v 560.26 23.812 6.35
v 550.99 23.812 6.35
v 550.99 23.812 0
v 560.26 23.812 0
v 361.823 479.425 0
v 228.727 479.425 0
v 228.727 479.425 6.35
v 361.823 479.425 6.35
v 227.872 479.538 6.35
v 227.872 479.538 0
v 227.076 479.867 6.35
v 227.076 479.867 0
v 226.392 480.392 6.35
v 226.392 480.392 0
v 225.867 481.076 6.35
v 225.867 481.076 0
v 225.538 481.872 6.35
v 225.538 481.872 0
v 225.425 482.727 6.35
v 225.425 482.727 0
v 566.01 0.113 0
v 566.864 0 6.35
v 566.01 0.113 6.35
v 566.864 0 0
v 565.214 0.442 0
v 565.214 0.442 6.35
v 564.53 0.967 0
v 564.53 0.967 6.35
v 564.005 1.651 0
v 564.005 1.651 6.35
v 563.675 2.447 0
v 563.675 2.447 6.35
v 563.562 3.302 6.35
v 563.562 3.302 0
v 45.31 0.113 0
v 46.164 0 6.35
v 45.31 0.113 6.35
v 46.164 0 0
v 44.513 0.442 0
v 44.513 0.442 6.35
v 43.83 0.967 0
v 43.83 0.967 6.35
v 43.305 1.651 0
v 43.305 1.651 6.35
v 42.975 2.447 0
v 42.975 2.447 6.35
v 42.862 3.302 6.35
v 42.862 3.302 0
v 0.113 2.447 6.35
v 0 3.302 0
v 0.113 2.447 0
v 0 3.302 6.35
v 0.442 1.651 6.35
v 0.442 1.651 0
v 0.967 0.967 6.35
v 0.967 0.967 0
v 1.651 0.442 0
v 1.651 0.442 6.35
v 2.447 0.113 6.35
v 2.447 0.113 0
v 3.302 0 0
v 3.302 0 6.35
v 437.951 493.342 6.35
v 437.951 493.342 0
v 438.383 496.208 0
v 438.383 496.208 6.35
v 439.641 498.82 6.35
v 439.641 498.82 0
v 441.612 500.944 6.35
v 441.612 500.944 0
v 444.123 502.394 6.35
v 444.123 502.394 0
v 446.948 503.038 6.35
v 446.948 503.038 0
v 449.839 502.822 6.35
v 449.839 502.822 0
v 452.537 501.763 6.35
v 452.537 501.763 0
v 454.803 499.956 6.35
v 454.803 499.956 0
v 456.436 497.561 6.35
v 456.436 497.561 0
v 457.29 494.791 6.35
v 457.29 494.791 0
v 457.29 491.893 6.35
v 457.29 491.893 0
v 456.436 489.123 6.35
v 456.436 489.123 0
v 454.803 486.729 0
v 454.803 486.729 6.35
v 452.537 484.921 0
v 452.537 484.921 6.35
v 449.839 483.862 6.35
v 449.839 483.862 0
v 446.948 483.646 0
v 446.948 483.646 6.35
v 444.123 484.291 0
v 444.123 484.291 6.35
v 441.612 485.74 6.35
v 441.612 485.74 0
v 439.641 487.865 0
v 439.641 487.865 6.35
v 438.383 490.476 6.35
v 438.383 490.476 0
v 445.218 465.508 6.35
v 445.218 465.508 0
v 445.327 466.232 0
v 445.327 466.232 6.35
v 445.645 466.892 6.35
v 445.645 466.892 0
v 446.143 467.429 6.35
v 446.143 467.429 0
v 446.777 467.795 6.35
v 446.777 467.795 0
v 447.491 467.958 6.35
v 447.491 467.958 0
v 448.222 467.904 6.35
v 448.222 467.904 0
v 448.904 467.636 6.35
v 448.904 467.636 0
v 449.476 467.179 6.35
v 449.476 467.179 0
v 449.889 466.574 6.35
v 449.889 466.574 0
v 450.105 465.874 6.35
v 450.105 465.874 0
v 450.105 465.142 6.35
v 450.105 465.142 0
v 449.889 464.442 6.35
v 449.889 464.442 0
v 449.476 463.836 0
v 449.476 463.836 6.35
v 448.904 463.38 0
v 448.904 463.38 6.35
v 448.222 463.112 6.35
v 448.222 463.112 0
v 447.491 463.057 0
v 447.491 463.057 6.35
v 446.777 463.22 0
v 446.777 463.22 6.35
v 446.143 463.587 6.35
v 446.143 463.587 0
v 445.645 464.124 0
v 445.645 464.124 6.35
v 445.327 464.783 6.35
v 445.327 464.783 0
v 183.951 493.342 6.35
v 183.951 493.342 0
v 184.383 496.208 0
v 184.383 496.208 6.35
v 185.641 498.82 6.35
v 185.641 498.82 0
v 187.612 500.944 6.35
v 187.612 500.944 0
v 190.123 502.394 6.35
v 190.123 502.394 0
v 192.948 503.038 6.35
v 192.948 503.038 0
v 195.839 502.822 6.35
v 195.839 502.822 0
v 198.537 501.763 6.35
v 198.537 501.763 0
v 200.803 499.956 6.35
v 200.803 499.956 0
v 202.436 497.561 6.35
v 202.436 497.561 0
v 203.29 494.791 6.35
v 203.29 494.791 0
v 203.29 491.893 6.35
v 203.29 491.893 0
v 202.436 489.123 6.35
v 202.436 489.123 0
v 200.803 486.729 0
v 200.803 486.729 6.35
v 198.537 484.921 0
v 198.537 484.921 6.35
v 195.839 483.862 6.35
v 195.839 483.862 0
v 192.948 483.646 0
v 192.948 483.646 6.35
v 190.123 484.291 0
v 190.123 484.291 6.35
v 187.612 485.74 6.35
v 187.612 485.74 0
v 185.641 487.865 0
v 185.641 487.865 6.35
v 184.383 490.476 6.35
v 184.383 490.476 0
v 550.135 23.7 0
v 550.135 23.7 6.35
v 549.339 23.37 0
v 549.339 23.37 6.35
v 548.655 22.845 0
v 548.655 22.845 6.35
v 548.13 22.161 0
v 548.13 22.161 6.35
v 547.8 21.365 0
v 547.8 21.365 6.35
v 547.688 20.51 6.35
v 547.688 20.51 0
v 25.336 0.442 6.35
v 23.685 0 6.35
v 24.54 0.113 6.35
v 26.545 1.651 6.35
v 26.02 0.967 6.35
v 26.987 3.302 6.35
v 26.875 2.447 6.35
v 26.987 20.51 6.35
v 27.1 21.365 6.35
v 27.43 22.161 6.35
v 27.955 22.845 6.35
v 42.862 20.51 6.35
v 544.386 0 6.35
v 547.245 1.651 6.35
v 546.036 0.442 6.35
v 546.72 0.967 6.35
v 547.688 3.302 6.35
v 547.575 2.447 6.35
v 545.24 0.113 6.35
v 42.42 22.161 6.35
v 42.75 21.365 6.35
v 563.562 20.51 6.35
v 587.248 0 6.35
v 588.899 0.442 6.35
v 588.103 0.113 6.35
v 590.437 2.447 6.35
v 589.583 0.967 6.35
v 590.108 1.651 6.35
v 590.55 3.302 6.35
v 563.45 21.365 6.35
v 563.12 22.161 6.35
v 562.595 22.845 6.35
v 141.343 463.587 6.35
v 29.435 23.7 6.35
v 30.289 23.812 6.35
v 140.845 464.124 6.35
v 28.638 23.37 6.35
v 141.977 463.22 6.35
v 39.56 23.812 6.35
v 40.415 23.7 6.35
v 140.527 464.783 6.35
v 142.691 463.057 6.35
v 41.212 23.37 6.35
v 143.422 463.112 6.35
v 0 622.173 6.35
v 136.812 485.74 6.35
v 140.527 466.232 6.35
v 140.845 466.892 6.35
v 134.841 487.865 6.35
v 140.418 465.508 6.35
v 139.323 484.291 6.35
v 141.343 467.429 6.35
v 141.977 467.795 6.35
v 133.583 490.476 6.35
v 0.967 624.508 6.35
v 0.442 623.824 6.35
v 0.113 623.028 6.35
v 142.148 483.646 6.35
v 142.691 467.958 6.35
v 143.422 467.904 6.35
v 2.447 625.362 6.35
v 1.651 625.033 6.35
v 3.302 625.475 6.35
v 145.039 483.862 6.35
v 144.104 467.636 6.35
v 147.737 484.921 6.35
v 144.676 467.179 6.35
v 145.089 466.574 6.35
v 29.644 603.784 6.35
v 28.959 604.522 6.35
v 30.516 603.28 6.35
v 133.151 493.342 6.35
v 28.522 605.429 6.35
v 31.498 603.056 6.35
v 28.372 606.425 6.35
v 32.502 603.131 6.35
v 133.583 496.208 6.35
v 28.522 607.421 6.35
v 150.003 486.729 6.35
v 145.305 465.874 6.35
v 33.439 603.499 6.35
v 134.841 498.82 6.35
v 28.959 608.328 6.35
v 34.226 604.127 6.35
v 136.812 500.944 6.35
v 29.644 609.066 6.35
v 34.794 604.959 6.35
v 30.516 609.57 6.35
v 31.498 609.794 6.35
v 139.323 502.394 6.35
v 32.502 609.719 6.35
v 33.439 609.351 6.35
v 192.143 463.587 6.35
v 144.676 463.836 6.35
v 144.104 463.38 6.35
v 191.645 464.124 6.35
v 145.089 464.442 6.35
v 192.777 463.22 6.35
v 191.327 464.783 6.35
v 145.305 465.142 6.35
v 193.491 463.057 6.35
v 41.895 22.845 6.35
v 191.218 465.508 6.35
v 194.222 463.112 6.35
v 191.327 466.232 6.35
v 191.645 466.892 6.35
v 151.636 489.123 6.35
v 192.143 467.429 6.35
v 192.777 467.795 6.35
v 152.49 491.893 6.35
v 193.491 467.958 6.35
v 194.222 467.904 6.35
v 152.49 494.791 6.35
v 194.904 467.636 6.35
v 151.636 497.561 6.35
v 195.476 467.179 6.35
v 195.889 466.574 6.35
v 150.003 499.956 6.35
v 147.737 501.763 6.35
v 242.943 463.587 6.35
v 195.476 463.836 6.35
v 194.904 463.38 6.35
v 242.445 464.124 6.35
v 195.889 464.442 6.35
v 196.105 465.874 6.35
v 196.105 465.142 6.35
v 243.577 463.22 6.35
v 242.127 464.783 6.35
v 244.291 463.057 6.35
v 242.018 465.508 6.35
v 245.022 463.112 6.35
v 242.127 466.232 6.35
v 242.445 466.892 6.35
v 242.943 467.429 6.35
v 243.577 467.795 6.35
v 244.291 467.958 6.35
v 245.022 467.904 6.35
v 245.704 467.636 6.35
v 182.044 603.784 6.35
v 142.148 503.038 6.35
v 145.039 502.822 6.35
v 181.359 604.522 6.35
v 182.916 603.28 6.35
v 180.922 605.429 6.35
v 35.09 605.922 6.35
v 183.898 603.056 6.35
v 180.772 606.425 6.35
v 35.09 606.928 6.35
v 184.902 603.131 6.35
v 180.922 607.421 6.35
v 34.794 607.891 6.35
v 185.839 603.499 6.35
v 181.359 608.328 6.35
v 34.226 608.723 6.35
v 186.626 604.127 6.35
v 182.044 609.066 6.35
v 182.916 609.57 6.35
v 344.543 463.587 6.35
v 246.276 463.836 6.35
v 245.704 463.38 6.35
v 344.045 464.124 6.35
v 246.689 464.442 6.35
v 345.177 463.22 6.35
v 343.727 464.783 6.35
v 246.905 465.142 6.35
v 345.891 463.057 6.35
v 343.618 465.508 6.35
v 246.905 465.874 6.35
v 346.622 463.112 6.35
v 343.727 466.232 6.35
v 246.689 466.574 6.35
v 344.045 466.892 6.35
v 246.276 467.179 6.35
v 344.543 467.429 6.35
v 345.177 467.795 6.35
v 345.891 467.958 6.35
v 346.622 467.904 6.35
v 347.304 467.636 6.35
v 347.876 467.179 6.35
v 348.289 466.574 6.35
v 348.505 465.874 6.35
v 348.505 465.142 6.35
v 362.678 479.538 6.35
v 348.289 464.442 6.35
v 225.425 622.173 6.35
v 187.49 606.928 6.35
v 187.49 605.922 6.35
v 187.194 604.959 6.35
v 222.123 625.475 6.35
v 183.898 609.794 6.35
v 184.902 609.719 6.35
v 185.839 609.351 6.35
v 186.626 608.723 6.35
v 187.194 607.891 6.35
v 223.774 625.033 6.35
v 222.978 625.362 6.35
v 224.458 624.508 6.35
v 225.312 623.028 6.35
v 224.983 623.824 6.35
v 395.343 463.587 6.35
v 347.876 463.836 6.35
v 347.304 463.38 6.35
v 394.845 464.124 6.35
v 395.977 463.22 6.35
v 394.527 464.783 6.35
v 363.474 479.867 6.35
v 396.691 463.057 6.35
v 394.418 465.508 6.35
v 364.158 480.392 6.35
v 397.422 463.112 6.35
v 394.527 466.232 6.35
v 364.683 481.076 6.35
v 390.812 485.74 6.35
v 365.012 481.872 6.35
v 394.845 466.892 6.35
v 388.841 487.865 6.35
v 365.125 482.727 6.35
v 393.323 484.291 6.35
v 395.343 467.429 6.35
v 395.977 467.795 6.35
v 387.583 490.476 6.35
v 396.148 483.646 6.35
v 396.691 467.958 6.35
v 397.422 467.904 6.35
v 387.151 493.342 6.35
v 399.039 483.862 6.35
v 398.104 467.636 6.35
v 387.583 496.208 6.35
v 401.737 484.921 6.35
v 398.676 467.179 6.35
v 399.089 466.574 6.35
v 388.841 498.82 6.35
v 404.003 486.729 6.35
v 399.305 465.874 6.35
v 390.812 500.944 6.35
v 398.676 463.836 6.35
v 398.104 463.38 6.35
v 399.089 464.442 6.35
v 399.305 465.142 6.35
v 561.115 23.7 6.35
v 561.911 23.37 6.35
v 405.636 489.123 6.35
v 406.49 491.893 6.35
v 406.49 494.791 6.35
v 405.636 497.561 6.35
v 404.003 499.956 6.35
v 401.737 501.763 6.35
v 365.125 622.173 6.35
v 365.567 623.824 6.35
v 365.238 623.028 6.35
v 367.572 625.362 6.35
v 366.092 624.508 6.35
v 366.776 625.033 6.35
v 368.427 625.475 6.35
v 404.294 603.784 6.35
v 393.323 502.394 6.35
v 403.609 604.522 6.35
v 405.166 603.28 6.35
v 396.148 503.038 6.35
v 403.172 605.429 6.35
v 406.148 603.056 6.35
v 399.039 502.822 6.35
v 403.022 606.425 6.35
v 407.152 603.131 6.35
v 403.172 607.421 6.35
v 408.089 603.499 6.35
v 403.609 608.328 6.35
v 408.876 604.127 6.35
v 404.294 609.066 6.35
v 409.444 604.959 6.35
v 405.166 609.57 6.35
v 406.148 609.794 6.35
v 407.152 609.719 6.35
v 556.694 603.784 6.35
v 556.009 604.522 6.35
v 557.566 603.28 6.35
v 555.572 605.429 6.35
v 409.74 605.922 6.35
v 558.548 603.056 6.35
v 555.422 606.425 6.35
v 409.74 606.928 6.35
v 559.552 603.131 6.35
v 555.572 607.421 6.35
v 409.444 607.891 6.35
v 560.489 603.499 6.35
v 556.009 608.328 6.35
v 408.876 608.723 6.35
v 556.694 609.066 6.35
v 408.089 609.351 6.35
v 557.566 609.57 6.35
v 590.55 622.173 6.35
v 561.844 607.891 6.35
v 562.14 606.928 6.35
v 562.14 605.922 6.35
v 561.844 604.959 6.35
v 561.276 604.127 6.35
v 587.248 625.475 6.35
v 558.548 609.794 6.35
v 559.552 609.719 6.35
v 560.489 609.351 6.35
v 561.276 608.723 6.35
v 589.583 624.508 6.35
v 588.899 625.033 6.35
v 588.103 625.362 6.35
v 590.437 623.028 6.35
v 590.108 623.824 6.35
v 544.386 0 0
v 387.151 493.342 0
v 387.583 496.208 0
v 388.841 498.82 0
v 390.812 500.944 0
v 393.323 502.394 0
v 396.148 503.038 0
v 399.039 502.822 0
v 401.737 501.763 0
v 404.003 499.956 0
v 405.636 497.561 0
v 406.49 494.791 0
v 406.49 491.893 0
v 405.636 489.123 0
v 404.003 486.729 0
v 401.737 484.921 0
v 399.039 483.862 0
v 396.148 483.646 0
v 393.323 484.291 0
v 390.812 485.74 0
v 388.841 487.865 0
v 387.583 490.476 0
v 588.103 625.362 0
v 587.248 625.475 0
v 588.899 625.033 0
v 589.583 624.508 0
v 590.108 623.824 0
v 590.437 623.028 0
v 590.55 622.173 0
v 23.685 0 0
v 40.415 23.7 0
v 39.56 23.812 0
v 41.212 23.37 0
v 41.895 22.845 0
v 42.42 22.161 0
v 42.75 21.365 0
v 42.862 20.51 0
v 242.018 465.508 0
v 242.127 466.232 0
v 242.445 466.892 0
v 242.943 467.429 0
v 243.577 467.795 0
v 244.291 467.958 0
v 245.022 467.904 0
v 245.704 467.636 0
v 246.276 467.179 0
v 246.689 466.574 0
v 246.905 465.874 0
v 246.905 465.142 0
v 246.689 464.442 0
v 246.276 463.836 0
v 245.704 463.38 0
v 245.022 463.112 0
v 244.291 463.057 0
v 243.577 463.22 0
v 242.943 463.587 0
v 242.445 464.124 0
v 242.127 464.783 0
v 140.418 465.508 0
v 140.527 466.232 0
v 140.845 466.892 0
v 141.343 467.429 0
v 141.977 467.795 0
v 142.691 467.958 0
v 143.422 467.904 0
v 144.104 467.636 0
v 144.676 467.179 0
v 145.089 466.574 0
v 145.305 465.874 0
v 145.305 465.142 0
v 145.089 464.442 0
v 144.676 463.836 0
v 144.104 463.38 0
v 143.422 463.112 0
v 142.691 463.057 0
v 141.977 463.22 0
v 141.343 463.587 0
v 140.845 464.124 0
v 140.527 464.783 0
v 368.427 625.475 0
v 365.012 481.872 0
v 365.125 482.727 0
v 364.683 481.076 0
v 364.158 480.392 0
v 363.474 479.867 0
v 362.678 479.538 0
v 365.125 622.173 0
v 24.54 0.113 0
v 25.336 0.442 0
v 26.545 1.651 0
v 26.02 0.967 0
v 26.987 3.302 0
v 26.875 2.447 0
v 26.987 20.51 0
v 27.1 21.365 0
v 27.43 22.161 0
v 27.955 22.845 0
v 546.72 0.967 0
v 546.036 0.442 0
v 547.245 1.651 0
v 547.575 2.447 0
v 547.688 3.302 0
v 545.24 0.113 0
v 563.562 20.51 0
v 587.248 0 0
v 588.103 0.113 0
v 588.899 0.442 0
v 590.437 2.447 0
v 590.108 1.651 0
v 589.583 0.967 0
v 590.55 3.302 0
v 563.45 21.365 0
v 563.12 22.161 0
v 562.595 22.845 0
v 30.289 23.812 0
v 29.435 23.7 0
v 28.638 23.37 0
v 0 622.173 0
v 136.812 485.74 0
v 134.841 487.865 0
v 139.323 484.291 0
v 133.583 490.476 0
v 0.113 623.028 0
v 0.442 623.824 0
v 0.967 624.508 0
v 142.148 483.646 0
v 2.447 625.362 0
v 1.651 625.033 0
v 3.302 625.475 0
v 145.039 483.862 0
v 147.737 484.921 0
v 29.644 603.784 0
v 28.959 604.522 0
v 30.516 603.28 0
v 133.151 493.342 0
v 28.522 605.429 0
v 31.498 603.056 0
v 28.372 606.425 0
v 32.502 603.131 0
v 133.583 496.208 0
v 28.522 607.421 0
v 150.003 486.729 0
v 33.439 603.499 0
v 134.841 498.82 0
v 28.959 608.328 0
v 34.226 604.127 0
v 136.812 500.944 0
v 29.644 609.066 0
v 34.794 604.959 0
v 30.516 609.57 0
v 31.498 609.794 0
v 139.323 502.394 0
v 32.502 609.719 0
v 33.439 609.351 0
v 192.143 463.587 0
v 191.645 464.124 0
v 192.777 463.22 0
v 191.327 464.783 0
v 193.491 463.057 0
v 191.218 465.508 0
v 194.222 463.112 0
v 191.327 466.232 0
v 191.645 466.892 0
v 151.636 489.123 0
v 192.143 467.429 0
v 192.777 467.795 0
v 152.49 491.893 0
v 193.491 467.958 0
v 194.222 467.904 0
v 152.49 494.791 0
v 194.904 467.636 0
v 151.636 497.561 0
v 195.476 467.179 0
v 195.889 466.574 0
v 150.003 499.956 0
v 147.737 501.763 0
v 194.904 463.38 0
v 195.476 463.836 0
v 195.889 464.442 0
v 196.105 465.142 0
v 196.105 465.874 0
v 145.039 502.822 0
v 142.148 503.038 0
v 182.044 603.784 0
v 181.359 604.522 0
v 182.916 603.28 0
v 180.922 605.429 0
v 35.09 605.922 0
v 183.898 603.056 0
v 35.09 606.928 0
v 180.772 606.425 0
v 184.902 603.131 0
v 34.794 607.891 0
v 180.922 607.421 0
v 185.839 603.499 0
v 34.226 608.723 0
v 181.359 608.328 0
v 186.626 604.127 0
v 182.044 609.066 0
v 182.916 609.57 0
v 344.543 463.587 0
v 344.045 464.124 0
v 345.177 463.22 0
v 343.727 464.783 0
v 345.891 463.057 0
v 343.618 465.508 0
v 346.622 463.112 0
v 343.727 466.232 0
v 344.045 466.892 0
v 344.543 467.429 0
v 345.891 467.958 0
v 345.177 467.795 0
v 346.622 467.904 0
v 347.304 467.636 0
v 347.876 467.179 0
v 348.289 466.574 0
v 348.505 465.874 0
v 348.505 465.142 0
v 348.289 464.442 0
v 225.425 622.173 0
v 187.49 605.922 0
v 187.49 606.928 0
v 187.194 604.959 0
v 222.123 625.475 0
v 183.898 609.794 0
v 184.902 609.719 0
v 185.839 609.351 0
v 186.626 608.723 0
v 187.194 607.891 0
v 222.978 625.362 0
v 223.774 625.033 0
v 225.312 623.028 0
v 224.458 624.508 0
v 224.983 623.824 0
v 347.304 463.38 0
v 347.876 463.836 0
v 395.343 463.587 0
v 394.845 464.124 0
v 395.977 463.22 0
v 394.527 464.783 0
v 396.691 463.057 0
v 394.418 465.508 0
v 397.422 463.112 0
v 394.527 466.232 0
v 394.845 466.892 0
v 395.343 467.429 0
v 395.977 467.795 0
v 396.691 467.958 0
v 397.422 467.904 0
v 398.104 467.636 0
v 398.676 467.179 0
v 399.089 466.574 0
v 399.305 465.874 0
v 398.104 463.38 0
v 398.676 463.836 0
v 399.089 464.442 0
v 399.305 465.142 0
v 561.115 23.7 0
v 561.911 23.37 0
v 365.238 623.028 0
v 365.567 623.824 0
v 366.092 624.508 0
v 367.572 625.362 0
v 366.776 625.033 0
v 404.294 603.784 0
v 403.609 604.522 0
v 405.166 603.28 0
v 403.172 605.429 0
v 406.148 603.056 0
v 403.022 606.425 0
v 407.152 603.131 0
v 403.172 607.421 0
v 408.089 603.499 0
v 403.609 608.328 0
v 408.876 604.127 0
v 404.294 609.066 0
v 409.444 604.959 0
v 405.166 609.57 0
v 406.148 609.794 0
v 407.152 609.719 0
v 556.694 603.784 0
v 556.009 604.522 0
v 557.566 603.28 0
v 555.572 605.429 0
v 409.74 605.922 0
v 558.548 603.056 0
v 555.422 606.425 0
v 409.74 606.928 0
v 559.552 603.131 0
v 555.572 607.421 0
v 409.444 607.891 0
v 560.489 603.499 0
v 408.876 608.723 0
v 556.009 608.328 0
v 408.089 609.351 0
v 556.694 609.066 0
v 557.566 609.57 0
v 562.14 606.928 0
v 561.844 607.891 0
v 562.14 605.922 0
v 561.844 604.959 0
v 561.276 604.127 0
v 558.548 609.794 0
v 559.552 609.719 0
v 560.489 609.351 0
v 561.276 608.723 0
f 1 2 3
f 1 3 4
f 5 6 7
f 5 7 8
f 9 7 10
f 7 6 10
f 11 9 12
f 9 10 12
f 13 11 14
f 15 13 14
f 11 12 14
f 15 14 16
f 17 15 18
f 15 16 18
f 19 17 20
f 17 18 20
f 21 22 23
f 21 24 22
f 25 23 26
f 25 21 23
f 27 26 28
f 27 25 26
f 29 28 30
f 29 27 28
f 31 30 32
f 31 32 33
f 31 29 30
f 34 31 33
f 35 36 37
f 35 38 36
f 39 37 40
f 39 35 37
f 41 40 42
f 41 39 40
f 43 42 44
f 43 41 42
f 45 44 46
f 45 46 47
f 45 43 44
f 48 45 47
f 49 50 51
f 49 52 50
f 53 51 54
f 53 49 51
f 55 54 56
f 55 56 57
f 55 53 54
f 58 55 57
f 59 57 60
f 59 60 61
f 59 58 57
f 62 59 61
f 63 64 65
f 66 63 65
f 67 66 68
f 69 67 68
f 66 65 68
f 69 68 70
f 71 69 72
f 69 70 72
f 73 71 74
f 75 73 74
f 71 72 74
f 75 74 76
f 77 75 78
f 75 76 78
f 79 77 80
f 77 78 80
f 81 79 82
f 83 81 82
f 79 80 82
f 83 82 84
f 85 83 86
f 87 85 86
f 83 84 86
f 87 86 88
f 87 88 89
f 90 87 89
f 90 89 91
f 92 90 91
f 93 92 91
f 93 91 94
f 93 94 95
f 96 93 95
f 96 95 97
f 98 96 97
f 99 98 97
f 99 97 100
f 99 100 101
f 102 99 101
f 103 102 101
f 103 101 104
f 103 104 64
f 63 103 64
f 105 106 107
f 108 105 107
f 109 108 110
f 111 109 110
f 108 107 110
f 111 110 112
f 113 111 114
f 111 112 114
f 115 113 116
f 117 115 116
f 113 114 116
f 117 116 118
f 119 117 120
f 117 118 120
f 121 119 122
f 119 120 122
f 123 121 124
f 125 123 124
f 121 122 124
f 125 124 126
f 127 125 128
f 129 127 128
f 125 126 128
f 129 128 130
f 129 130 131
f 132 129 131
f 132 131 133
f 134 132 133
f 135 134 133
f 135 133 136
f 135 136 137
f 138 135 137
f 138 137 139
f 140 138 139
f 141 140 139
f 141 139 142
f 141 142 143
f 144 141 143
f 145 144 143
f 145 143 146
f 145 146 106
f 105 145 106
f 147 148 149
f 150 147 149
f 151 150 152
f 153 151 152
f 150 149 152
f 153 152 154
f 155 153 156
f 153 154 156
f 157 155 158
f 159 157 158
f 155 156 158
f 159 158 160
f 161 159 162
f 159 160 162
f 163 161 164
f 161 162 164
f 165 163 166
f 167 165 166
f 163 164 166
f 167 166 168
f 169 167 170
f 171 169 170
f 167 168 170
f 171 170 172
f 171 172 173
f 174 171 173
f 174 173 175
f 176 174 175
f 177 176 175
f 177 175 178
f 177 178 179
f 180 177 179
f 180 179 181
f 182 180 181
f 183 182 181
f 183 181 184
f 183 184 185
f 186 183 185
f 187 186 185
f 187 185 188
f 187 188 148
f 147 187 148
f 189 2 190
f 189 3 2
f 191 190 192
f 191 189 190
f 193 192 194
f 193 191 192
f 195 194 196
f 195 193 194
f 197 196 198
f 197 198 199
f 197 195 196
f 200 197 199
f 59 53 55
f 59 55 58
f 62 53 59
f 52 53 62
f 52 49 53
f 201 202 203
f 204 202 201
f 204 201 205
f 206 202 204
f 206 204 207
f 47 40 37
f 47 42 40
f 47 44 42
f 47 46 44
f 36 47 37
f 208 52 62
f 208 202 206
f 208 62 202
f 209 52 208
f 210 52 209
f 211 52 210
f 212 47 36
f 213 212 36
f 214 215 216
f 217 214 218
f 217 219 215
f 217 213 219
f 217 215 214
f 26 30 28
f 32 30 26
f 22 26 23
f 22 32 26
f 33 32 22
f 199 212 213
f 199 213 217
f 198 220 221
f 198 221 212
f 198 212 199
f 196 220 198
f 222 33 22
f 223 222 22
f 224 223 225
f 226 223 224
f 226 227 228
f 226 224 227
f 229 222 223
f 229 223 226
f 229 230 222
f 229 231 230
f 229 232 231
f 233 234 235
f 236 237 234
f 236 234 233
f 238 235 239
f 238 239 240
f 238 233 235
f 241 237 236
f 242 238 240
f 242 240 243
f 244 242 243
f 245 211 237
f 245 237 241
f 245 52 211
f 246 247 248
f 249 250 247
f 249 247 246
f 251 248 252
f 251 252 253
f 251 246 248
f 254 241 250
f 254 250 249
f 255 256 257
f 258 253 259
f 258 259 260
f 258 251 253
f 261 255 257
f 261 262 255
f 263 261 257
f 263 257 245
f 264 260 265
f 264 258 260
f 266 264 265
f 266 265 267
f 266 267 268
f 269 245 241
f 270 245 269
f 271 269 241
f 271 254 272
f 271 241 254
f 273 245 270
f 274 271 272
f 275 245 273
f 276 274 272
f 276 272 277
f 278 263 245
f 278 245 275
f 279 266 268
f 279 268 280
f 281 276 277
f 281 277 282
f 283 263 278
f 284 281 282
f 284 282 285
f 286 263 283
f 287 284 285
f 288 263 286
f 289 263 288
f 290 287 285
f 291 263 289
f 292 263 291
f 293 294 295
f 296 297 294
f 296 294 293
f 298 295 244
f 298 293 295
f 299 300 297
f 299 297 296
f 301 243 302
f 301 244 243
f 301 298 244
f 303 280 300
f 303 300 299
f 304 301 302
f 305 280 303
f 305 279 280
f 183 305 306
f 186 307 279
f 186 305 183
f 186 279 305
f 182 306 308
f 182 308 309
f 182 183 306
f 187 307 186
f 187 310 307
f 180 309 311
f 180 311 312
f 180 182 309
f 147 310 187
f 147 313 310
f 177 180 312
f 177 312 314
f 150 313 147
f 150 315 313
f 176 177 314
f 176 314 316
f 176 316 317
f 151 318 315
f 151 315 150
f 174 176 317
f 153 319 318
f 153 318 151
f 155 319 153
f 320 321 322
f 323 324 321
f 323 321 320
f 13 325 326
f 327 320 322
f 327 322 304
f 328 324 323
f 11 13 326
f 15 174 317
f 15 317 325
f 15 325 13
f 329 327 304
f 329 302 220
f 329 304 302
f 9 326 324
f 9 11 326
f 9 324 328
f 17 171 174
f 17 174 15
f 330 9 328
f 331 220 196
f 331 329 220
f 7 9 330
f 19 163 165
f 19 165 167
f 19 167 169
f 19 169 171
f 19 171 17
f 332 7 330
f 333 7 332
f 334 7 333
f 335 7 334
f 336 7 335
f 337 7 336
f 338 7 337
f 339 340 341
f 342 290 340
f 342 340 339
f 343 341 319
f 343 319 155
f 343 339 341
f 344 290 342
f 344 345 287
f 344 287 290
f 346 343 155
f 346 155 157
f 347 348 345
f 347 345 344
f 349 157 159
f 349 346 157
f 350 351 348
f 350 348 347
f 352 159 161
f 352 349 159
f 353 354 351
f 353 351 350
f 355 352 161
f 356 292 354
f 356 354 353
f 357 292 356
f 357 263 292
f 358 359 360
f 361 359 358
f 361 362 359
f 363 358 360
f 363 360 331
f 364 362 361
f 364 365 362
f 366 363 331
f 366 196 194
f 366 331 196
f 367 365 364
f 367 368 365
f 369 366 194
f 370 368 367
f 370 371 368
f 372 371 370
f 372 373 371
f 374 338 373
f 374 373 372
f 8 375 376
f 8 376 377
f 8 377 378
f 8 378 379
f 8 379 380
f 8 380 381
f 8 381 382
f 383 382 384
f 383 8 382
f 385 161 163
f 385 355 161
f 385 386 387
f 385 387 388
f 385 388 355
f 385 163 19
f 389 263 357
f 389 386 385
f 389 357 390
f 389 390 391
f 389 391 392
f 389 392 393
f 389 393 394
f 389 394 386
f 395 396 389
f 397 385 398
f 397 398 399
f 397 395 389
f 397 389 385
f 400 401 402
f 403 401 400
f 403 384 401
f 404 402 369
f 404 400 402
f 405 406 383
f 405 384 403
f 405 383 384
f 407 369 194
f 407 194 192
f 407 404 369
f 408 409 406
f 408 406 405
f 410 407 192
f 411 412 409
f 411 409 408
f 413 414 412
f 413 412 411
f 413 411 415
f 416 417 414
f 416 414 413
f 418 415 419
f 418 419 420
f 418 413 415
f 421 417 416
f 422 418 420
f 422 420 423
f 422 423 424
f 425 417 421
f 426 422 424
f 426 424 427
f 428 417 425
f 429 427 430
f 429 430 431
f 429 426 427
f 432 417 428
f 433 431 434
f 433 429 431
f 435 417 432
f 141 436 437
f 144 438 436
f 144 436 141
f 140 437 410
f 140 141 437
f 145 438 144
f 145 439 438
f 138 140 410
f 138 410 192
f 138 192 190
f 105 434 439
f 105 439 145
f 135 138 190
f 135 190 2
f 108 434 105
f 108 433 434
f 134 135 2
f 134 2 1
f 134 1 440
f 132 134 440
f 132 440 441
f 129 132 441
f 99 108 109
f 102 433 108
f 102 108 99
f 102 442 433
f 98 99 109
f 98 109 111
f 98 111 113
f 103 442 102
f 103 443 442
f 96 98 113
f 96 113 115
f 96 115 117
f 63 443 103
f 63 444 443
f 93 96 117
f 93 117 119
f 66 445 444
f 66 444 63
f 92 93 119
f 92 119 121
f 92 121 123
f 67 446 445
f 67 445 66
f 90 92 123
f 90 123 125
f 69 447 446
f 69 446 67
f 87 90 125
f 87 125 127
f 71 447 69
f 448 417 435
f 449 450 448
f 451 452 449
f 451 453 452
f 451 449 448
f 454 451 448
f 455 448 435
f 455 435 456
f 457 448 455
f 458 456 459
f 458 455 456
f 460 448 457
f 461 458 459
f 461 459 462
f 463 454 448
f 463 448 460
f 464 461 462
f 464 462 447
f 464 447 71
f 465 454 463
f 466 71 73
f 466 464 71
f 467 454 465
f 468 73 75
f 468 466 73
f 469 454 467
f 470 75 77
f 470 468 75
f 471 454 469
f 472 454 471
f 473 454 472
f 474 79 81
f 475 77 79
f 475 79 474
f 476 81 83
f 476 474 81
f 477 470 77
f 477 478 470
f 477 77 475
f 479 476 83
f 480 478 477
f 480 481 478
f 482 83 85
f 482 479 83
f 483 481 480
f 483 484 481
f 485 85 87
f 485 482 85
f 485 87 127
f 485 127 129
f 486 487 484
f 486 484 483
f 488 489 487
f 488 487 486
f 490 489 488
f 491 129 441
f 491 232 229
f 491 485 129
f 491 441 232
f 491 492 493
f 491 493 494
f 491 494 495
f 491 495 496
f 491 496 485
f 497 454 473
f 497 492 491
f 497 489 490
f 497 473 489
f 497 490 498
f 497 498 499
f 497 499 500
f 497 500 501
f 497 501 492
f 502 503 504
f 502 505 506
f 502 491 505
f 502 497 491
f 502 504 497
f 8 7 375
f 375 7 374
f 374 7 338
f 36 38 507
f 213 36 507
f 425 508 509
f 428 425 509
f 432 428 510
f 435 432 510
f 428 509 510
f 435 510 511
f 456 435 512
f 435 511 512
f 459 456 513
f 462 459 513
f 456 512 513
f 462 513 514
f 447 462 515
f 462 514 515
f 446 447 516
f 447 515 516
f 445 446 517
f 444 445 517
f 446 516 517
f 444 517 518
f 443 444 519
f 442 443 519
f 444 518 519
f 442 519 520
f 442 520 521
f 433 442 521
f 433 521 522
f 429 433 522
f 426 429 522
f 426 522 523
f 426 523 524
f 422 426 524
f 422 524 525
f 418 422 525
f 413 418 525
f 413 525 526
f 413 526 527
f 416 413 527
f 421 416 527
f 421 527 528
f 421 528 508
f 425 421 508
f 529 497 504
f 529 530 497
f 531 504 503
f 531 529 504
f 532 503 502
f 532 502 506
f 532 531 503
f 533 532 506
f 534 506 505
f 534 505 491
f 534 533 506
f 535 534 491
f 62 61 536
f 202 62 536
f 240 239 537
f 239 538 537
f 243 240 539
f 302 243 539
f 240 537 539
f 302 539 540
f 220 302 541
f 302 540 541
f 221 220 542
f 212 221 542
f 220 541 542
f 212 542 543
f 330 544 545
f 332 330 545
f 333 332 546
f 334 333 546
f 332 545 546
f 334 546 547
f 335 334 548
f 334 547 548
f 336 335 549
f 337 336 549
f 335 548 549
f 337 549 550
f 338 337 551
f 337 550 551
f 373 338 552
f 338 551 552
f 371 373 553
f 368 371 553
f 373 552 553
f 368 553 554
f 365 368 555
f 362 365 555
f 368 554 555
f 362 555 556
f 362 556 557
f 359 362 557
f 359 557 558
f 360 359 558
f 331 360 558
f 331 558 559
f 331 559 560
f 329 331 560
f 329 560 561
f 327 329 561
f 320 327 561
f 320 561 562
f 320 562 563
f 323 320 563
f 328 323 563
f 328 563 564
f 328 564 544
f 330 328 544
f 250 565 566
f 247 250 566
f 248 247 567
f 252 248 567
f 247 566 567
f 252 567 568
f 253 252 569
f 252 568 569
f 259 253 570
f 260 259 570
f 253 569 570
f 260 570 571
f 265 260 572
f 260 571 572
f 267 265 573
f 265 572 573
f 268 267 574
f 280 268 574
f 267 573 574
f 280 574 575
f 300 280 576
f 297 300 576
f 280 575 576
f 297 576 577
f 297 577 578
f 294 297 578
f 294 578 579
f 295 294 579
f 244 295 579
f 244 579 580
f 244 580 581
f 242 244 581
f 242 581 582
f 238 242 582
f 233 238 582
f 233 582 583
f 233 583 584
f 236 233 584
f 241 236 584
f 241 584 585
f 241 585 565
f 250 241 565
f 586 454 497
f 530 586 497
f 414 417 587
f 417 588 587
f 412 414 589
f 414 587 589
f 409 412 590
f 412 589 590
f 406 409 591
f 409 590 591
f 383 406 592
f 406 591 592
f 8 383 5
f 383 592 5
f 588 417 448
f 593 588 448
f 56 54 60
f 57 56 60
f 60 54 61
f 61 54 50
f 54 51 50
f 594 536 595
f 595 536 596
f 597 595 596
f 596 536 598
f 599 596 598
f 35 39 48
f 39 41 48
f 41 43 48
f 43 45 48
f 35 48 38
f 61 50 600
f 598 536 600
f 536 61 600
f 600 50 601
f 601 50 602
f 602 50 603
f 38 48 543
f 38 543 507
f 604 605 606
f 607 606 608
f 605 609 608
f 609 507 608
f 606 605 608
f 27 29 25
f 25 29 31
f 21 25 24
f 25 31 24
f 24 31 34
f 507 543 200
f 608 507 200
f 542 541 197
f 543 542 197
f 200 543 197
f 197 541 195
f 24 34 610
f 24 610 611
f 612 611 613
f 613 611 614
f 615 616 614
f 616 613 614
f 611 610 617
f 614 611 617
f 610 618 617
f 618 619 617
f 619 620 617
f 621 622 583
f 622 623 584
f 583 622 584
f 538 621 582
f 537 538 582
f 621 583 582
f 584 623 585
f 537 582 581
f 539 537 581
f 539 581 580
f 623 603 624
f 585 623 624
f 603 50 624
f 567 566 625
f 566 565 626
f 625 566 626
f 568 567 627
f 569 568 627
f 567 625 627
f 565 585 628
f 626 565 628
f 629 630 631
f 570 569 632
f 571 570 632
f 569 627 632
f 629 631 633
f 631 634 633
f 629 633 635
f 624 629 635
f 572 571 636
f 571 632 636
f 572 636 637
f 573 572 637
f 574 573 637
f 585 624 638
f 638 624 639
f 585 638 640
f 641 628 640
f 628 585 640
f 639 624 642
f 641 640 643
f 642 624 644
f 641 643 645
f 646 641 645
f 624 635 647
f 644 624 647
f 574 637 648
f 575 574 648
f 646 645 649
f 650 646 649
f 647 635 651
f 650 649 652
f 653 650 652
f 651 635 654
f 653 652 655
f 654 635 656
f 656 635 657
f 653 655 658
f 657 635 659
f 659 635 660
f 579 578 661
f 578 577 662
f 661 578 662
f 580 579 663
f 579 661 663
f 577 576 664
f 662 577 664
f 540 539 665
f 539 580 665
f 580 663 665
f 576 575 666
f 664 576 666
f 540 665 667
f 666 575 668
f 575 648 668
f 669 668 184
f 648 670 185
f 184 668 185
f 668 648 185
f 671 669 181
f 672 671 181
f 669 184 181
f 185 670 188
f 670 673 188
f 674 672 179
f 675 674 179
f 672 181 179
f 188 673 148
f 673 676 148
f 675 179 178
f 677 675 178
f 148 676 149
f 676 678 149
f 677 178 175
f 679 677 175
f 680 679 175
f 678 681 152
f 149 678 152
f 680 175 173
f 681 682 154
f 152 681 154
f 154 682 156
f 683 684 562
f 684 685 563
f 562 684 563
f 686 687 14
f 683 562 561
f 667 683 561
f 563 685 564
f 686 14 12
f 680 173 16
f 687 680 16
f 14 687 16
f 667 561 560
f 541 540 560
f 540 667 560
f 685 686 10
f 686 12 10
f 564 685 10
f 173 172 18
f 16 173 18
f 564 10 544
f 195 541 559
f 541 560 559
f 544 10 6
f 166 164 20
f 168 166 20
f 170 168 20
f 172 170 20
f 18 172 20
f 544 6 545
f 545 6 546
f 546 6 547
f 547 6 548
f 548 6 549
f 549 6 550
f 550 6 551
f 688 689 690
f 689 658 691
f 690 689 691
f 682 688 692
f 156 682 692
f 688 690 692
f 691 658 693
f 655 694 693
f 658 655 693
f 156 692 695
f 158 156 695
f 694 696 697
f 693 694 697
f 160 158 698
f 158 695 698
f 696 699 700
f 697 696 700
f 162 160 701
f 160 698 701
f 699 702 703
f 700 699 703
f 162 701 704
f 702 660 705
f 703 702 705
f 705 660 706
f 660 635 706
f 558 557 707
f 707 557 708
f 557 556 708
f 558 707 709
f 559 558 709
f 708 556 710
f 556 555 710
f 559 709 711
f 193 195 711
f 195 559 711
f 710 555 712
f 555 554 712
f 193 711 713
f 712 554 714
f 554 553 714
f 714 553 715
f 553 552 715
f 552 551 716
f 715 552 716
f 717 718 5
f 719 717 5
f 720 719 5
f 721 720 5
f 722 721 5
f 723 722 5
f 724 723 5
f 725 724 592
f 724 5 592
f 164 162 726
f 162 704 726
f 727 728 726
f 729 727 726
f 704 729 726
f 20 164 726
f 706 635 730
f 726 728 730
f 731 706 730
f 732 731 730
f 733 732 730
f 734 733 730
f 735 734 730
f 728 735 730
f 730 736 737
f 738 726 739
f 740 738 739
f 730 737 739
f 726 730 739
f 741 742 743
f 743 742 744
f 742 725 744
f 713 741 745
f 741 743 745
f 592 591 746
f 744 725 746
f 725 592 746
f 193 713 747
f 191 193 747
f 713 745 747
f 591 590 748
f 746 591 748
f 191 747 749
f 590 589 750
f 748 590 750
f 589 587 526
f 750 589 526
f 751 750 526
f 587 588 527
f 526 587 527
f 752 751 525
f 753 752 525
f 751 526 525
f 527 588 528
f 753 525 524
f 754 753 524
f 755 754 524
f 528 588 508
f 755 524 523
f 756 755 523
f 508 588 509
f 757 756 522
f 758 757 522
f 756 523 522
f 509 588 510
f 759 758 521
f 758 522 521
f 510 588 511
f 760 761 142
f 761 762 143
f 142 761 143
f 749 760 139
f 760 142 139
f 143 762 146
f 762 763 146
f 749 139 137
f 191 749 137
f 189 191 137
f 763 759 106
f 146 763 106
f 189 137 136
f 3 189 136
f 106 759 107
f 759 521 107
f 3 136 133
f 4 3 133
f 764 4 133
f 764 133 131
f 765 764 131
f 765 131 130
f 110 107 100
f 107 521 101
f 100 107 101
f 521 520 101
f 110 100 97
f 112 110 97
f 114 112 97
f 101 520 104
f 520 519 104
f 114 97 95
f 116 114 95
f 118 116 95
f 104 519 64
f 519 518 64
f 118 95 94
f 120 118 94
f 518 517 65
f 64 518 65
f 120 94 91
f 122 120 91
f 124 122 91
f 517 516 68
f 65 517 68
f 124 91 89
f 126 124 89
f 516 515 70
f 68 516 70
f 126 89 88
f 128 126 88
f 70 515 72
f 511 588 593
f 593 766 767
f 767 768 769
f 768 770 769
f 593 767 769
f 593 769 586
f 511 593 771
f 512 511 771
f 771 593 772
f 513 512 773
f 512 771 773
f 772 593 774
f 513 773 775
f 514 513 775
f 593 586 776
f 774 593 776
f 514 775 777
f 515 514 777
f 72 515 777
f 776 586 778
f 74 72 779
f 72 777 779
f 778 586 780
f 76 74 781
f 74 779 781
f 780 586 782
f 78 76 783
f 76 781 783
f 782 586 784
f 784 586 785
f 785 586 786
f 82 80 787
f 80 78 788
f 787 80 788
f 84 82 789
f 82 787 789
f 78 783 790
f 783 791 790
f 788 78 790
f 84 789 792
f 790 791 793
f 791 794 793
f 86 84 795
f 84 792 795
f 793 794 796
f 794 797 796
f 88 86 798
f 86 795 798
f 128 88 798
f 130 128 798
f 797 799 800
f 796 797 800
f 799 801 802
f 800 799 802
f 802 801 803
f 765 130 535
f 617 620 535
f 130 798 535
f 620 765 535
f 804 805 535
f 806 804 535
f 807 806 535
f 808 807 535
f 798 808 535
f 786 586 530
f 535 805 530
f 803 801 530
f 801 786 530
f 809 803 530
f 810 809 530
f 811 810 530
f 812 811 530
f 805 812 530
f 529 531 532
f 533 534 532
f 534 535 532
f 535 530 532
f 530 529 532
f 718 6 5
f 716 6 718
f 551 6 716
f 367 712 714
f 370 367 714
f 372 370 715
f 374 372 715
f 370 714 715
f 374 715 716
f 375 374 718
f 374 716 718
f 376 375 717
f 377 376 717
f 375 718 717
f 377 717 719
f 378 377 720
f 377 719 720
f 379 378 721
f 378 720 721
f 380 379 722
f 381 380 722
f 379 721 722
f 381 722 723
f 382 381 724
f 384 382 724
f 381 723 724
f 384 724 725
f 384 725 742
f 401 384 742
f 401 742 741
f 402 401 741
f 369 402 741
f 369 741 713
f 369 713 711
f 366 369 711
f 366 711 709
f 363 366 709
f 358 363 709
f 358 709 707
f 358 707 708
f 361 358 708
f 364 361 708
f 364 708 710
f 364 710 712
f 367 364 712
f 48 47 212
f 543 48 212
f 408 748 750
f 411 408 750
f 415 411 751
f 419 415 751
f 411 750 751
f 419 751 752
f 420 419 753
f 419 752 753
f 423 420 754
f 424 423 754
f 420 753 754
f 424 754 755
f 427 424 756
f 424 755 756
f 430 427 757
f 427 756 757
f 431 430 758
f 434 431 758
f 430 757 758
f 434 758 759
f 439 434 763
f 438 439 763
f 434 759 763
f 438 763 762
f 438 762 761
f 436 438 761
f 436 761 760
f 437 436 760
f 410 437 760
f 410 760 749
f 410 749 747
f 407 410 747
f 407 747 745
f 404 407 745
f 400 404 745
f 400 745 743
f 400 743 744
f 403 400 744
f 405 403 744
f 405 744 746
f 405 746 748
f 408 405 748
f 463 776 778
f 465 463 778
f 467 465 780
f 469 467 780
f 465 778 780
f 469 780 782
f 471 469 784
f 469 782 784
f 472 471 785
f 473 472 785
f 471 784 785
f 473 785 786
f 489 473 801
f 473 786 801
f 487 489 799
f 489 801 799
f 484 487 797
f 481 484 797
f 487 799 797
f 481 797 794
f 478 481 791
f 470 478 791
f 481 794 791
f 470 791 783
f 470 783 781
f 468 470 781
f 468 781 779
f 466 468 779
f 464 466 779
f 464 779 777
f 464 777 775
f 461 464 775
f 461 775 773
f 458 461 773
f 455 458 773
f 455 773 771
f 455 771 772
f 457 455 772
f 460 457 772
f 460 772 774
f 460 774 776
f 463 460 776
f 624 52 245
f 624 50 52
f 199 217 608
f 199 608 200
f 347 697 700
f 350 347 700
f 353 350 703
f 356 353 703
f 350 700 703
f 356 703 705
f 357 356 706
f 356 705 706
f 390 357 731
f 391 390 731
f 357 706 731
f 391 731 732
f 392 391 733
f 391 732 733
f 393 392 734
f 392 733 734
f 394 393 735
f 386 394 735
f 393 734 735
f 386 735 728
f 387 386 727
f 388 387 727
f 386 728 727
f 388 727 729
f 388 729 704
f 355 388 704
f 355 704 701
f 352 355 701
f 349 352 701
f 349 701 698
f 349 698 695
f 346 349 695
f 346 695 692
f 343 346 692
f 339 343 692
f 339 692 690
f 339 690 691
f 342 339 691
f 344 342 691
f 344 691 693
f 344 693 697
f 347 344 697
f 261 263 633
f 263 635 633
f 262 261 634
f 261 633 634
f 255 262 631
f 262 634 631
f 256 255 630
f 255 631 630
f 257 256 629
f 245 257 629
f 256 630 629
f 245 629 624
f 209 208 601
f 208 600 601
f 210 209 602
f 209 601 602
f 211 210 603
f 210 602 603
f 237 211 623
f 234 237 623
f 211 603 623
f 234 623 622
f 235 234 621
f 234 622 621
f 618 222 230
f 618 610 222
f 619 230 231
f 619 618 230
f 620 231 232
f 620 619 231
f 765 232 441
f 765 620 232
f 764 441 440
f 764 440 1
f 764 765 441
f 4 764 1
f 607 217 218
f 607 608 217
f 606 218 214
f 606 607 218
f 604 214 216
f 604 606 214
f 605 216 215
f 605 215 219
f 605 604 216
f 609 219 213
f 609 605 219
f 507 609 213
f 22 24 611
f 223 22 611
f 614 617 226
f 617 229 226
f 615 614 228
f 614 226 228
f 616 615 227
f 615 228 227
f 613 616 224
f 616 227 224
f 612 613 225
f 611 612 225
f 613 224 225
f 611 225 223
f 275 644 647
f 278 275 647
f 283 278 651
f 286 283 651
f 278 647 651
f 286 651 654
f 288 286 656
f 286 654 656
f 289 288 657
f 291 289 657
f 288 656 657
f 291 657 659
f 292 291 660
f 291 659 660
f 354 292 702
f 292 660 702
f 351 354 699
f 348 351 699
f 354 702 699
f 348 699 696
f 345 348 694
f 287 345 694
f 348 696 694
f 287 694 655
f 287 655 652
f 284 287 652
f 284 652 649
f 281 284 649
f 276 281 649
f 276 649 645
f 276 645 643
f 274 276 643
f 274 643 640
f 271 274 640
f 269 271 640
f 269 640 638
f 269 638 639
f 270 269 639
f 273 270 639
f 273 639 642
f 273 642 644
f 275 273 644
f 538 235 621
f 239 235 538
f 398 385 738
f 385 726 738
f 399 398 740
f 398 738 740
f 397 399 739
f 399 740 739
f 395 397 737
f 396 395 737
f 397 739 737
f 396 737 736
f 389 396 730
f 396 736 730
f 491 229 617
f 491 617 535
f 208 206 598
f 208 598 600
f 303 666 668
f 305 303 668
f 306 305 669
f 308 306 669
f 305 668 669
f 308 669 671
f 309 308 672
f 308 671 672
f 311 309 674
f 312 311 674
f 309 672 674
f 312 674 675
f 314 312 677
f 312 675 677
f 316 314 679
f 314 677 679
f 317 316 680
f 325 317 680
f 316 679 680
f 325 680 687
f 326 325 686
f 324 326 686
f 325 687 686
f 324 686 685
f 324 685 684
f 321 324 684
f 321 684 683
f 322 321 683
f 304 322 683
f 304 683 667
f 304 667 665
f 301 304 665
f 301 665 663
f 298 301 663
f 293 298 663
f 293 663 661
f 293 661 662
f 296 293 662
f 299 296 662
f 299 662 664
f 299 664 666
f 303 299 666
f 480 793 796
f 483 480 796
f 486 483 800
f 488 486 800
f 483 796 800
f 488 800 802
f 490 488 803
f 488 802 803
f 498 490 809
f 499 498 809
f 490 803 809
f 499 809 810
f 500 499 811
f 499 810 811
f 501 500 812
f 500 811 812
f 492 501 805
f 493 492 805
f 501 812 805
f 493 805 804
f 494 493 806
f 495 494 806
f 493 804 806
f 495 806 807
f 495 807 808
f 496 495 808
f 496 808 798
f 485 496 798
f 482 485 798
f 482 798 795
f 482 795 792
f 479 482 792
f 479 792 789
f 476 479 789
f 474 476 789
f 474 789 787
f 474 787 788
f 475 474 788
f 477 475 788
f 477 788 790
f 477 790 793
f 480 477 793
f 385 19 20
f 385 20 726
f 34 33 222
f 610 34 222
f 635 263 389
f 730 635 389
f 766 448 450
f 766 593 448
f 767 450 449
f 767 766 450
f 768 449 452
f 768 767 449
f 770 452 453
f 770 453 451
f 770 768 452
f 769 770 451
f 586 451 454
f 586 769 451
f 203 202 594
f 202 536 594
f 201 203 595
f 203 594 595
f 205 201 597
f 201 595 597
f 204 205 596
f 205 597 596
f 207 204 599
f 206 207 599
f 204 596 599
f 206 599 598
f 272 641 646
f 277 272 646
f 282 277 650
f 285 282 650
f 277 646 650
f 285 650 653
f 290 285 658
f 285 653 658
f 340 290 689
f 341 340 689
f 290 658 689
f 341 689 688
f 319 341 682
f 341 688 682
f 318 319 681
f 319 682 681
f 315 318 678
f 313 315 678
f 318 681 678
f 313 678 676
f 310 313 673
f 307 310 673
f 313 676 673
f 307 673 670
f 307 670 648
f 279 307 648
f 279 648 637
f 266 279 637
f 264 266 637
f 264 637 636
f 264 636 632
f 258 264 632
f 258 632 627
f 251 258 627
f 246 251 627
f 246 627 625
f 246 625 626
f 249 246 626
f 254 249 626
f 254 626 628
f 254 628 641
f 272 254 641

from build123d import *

# Parameters (mm, degrees)
SKETCH1_W                        = 590.55
SKETCH1_H                        = 479.425
BOSS_EXTRUDE1_DEPTH              = 6.35
SKETCH2_W                        = 15.875
SKETCH2_H                        = 23.8125
CUT_EXTRUDE1_DEPTH               = 761.682559038
F_10_0_1935_DIAMETER_HOLE1_D     = 4.9149
SKETCH6_W                        = 225.425
SKETCH6_H                        = 146.05
BOSS_EXTRUDE3_DEPTH              = 6.35
F_49_64_0_76563_DIAMETER_HOLE1_D = 19.447002
F_1_4_CLEARANCE_HOLE1_D          = 6.7564
FILLET1_R                        = 3.302


with BuildPart() as part:
    # Sketch1 → Boss-Extrude1 (new body)
    with BuildSketch(Plane.XY):
        with Locations((295.275, 239.7125)):
            Rectangle(SKETCH1_W, SKETCH1_H)
    extrude(amount=BOSS_EXTRUDE1_DEPTH)

    # Sketch2 → Cut-Extrude1 (cut, through all)
    with BuildSketch(Plane.XY.offset(6.35)):
        with Locations((34.925, 11.90625)):
            Rectangle(SKETCH2_W, SKETCH2_H)
        with Locations((555.625, 11.90625)):
            Rectangle(SKETCH2_W, SKETCH2_H)
    extrude(amount=-CUT_EXTRUDE1_DEPTH, mode=Mode.SUBTRACT)

    # #10 (0.1935) Diameter Hole1 (through all)
    with Locations(Plane.XY.offset(6.35)):
        with Locations((142.875, 465.507832), (244.475, 465.507832), (346.075, 465.507832), (447.675, 465.507832), (193.675, 465.507832), (396.875, 465.507832)):
            Hole(F_10_0_1935_DIAMETER_HOLE1_D / 2)

    # Sketch6 → Boss-Extrude3 (add)
    with BuildSketch(Plane.XY.offset(6.35)):
        with Locations((477.8375, 552.45)):
            Rectangle(SKETCH6_W, SKETCH6_H)
        with Locations((112.7125, 552.45)):
            Rectangle(SKETCH6_W, SKETCH6_H)
    extrude(amount=-BOSS_EXTRUDE3_DEPTH)

    # 49/64 (0.76563) Diameter Hole1 (through all)
    with Locations(Plane.XY.offset(6.35)):
        with Locations((142.875, 493.342168), (447.675, 493.342168), (193.675, 493.342168), (396.875, 493.342168)):
            Hole(F_49_64_0_76563_DIAMETER_HOLE1_D / 2)

    # 1/4 Clearance Hole1 (through all)
    with Locations(Plane.XY.offset(6.35)):
        with Locations((31.75, 606.425), (184.15, 606.425), (406.4, 606.425), (558.8, 606.425)):
            Hole(F_1_4_CLEARANCE_HOLE1_D / 2)

    # Fillet1
    fillet1_edges = [part.edges().sort_by_distance(p)[0] for p in [
        (42.8625, 0, 3.175),
        (26.9875, 0, 3.175),
        (26.9875, 23.8125, 3.175),
        (42.8625, 23.8125, 3.175),
        (563.5625, 0, 3.175),
        (547.6875, 0, 3.175),
        (547.6875, 23.8125, 3.175),
        (563.5625, 23.8125, 3.175),
        (590.55, 0, 3.175),
        (365.125, 625.475, 3.175),
        (365.125, 479.425, 3.175),
        (590.55, 625.475, 3.175),
        (0, 0, 3.175),
        (225.425, 479.425, 3.175),
        (225.425, 625.475, 3.175),
        (0, 625.475, 3.175),
    ]]
    fillet(fillet1_edges, radius=FILLET1_R)


solid = part.part
